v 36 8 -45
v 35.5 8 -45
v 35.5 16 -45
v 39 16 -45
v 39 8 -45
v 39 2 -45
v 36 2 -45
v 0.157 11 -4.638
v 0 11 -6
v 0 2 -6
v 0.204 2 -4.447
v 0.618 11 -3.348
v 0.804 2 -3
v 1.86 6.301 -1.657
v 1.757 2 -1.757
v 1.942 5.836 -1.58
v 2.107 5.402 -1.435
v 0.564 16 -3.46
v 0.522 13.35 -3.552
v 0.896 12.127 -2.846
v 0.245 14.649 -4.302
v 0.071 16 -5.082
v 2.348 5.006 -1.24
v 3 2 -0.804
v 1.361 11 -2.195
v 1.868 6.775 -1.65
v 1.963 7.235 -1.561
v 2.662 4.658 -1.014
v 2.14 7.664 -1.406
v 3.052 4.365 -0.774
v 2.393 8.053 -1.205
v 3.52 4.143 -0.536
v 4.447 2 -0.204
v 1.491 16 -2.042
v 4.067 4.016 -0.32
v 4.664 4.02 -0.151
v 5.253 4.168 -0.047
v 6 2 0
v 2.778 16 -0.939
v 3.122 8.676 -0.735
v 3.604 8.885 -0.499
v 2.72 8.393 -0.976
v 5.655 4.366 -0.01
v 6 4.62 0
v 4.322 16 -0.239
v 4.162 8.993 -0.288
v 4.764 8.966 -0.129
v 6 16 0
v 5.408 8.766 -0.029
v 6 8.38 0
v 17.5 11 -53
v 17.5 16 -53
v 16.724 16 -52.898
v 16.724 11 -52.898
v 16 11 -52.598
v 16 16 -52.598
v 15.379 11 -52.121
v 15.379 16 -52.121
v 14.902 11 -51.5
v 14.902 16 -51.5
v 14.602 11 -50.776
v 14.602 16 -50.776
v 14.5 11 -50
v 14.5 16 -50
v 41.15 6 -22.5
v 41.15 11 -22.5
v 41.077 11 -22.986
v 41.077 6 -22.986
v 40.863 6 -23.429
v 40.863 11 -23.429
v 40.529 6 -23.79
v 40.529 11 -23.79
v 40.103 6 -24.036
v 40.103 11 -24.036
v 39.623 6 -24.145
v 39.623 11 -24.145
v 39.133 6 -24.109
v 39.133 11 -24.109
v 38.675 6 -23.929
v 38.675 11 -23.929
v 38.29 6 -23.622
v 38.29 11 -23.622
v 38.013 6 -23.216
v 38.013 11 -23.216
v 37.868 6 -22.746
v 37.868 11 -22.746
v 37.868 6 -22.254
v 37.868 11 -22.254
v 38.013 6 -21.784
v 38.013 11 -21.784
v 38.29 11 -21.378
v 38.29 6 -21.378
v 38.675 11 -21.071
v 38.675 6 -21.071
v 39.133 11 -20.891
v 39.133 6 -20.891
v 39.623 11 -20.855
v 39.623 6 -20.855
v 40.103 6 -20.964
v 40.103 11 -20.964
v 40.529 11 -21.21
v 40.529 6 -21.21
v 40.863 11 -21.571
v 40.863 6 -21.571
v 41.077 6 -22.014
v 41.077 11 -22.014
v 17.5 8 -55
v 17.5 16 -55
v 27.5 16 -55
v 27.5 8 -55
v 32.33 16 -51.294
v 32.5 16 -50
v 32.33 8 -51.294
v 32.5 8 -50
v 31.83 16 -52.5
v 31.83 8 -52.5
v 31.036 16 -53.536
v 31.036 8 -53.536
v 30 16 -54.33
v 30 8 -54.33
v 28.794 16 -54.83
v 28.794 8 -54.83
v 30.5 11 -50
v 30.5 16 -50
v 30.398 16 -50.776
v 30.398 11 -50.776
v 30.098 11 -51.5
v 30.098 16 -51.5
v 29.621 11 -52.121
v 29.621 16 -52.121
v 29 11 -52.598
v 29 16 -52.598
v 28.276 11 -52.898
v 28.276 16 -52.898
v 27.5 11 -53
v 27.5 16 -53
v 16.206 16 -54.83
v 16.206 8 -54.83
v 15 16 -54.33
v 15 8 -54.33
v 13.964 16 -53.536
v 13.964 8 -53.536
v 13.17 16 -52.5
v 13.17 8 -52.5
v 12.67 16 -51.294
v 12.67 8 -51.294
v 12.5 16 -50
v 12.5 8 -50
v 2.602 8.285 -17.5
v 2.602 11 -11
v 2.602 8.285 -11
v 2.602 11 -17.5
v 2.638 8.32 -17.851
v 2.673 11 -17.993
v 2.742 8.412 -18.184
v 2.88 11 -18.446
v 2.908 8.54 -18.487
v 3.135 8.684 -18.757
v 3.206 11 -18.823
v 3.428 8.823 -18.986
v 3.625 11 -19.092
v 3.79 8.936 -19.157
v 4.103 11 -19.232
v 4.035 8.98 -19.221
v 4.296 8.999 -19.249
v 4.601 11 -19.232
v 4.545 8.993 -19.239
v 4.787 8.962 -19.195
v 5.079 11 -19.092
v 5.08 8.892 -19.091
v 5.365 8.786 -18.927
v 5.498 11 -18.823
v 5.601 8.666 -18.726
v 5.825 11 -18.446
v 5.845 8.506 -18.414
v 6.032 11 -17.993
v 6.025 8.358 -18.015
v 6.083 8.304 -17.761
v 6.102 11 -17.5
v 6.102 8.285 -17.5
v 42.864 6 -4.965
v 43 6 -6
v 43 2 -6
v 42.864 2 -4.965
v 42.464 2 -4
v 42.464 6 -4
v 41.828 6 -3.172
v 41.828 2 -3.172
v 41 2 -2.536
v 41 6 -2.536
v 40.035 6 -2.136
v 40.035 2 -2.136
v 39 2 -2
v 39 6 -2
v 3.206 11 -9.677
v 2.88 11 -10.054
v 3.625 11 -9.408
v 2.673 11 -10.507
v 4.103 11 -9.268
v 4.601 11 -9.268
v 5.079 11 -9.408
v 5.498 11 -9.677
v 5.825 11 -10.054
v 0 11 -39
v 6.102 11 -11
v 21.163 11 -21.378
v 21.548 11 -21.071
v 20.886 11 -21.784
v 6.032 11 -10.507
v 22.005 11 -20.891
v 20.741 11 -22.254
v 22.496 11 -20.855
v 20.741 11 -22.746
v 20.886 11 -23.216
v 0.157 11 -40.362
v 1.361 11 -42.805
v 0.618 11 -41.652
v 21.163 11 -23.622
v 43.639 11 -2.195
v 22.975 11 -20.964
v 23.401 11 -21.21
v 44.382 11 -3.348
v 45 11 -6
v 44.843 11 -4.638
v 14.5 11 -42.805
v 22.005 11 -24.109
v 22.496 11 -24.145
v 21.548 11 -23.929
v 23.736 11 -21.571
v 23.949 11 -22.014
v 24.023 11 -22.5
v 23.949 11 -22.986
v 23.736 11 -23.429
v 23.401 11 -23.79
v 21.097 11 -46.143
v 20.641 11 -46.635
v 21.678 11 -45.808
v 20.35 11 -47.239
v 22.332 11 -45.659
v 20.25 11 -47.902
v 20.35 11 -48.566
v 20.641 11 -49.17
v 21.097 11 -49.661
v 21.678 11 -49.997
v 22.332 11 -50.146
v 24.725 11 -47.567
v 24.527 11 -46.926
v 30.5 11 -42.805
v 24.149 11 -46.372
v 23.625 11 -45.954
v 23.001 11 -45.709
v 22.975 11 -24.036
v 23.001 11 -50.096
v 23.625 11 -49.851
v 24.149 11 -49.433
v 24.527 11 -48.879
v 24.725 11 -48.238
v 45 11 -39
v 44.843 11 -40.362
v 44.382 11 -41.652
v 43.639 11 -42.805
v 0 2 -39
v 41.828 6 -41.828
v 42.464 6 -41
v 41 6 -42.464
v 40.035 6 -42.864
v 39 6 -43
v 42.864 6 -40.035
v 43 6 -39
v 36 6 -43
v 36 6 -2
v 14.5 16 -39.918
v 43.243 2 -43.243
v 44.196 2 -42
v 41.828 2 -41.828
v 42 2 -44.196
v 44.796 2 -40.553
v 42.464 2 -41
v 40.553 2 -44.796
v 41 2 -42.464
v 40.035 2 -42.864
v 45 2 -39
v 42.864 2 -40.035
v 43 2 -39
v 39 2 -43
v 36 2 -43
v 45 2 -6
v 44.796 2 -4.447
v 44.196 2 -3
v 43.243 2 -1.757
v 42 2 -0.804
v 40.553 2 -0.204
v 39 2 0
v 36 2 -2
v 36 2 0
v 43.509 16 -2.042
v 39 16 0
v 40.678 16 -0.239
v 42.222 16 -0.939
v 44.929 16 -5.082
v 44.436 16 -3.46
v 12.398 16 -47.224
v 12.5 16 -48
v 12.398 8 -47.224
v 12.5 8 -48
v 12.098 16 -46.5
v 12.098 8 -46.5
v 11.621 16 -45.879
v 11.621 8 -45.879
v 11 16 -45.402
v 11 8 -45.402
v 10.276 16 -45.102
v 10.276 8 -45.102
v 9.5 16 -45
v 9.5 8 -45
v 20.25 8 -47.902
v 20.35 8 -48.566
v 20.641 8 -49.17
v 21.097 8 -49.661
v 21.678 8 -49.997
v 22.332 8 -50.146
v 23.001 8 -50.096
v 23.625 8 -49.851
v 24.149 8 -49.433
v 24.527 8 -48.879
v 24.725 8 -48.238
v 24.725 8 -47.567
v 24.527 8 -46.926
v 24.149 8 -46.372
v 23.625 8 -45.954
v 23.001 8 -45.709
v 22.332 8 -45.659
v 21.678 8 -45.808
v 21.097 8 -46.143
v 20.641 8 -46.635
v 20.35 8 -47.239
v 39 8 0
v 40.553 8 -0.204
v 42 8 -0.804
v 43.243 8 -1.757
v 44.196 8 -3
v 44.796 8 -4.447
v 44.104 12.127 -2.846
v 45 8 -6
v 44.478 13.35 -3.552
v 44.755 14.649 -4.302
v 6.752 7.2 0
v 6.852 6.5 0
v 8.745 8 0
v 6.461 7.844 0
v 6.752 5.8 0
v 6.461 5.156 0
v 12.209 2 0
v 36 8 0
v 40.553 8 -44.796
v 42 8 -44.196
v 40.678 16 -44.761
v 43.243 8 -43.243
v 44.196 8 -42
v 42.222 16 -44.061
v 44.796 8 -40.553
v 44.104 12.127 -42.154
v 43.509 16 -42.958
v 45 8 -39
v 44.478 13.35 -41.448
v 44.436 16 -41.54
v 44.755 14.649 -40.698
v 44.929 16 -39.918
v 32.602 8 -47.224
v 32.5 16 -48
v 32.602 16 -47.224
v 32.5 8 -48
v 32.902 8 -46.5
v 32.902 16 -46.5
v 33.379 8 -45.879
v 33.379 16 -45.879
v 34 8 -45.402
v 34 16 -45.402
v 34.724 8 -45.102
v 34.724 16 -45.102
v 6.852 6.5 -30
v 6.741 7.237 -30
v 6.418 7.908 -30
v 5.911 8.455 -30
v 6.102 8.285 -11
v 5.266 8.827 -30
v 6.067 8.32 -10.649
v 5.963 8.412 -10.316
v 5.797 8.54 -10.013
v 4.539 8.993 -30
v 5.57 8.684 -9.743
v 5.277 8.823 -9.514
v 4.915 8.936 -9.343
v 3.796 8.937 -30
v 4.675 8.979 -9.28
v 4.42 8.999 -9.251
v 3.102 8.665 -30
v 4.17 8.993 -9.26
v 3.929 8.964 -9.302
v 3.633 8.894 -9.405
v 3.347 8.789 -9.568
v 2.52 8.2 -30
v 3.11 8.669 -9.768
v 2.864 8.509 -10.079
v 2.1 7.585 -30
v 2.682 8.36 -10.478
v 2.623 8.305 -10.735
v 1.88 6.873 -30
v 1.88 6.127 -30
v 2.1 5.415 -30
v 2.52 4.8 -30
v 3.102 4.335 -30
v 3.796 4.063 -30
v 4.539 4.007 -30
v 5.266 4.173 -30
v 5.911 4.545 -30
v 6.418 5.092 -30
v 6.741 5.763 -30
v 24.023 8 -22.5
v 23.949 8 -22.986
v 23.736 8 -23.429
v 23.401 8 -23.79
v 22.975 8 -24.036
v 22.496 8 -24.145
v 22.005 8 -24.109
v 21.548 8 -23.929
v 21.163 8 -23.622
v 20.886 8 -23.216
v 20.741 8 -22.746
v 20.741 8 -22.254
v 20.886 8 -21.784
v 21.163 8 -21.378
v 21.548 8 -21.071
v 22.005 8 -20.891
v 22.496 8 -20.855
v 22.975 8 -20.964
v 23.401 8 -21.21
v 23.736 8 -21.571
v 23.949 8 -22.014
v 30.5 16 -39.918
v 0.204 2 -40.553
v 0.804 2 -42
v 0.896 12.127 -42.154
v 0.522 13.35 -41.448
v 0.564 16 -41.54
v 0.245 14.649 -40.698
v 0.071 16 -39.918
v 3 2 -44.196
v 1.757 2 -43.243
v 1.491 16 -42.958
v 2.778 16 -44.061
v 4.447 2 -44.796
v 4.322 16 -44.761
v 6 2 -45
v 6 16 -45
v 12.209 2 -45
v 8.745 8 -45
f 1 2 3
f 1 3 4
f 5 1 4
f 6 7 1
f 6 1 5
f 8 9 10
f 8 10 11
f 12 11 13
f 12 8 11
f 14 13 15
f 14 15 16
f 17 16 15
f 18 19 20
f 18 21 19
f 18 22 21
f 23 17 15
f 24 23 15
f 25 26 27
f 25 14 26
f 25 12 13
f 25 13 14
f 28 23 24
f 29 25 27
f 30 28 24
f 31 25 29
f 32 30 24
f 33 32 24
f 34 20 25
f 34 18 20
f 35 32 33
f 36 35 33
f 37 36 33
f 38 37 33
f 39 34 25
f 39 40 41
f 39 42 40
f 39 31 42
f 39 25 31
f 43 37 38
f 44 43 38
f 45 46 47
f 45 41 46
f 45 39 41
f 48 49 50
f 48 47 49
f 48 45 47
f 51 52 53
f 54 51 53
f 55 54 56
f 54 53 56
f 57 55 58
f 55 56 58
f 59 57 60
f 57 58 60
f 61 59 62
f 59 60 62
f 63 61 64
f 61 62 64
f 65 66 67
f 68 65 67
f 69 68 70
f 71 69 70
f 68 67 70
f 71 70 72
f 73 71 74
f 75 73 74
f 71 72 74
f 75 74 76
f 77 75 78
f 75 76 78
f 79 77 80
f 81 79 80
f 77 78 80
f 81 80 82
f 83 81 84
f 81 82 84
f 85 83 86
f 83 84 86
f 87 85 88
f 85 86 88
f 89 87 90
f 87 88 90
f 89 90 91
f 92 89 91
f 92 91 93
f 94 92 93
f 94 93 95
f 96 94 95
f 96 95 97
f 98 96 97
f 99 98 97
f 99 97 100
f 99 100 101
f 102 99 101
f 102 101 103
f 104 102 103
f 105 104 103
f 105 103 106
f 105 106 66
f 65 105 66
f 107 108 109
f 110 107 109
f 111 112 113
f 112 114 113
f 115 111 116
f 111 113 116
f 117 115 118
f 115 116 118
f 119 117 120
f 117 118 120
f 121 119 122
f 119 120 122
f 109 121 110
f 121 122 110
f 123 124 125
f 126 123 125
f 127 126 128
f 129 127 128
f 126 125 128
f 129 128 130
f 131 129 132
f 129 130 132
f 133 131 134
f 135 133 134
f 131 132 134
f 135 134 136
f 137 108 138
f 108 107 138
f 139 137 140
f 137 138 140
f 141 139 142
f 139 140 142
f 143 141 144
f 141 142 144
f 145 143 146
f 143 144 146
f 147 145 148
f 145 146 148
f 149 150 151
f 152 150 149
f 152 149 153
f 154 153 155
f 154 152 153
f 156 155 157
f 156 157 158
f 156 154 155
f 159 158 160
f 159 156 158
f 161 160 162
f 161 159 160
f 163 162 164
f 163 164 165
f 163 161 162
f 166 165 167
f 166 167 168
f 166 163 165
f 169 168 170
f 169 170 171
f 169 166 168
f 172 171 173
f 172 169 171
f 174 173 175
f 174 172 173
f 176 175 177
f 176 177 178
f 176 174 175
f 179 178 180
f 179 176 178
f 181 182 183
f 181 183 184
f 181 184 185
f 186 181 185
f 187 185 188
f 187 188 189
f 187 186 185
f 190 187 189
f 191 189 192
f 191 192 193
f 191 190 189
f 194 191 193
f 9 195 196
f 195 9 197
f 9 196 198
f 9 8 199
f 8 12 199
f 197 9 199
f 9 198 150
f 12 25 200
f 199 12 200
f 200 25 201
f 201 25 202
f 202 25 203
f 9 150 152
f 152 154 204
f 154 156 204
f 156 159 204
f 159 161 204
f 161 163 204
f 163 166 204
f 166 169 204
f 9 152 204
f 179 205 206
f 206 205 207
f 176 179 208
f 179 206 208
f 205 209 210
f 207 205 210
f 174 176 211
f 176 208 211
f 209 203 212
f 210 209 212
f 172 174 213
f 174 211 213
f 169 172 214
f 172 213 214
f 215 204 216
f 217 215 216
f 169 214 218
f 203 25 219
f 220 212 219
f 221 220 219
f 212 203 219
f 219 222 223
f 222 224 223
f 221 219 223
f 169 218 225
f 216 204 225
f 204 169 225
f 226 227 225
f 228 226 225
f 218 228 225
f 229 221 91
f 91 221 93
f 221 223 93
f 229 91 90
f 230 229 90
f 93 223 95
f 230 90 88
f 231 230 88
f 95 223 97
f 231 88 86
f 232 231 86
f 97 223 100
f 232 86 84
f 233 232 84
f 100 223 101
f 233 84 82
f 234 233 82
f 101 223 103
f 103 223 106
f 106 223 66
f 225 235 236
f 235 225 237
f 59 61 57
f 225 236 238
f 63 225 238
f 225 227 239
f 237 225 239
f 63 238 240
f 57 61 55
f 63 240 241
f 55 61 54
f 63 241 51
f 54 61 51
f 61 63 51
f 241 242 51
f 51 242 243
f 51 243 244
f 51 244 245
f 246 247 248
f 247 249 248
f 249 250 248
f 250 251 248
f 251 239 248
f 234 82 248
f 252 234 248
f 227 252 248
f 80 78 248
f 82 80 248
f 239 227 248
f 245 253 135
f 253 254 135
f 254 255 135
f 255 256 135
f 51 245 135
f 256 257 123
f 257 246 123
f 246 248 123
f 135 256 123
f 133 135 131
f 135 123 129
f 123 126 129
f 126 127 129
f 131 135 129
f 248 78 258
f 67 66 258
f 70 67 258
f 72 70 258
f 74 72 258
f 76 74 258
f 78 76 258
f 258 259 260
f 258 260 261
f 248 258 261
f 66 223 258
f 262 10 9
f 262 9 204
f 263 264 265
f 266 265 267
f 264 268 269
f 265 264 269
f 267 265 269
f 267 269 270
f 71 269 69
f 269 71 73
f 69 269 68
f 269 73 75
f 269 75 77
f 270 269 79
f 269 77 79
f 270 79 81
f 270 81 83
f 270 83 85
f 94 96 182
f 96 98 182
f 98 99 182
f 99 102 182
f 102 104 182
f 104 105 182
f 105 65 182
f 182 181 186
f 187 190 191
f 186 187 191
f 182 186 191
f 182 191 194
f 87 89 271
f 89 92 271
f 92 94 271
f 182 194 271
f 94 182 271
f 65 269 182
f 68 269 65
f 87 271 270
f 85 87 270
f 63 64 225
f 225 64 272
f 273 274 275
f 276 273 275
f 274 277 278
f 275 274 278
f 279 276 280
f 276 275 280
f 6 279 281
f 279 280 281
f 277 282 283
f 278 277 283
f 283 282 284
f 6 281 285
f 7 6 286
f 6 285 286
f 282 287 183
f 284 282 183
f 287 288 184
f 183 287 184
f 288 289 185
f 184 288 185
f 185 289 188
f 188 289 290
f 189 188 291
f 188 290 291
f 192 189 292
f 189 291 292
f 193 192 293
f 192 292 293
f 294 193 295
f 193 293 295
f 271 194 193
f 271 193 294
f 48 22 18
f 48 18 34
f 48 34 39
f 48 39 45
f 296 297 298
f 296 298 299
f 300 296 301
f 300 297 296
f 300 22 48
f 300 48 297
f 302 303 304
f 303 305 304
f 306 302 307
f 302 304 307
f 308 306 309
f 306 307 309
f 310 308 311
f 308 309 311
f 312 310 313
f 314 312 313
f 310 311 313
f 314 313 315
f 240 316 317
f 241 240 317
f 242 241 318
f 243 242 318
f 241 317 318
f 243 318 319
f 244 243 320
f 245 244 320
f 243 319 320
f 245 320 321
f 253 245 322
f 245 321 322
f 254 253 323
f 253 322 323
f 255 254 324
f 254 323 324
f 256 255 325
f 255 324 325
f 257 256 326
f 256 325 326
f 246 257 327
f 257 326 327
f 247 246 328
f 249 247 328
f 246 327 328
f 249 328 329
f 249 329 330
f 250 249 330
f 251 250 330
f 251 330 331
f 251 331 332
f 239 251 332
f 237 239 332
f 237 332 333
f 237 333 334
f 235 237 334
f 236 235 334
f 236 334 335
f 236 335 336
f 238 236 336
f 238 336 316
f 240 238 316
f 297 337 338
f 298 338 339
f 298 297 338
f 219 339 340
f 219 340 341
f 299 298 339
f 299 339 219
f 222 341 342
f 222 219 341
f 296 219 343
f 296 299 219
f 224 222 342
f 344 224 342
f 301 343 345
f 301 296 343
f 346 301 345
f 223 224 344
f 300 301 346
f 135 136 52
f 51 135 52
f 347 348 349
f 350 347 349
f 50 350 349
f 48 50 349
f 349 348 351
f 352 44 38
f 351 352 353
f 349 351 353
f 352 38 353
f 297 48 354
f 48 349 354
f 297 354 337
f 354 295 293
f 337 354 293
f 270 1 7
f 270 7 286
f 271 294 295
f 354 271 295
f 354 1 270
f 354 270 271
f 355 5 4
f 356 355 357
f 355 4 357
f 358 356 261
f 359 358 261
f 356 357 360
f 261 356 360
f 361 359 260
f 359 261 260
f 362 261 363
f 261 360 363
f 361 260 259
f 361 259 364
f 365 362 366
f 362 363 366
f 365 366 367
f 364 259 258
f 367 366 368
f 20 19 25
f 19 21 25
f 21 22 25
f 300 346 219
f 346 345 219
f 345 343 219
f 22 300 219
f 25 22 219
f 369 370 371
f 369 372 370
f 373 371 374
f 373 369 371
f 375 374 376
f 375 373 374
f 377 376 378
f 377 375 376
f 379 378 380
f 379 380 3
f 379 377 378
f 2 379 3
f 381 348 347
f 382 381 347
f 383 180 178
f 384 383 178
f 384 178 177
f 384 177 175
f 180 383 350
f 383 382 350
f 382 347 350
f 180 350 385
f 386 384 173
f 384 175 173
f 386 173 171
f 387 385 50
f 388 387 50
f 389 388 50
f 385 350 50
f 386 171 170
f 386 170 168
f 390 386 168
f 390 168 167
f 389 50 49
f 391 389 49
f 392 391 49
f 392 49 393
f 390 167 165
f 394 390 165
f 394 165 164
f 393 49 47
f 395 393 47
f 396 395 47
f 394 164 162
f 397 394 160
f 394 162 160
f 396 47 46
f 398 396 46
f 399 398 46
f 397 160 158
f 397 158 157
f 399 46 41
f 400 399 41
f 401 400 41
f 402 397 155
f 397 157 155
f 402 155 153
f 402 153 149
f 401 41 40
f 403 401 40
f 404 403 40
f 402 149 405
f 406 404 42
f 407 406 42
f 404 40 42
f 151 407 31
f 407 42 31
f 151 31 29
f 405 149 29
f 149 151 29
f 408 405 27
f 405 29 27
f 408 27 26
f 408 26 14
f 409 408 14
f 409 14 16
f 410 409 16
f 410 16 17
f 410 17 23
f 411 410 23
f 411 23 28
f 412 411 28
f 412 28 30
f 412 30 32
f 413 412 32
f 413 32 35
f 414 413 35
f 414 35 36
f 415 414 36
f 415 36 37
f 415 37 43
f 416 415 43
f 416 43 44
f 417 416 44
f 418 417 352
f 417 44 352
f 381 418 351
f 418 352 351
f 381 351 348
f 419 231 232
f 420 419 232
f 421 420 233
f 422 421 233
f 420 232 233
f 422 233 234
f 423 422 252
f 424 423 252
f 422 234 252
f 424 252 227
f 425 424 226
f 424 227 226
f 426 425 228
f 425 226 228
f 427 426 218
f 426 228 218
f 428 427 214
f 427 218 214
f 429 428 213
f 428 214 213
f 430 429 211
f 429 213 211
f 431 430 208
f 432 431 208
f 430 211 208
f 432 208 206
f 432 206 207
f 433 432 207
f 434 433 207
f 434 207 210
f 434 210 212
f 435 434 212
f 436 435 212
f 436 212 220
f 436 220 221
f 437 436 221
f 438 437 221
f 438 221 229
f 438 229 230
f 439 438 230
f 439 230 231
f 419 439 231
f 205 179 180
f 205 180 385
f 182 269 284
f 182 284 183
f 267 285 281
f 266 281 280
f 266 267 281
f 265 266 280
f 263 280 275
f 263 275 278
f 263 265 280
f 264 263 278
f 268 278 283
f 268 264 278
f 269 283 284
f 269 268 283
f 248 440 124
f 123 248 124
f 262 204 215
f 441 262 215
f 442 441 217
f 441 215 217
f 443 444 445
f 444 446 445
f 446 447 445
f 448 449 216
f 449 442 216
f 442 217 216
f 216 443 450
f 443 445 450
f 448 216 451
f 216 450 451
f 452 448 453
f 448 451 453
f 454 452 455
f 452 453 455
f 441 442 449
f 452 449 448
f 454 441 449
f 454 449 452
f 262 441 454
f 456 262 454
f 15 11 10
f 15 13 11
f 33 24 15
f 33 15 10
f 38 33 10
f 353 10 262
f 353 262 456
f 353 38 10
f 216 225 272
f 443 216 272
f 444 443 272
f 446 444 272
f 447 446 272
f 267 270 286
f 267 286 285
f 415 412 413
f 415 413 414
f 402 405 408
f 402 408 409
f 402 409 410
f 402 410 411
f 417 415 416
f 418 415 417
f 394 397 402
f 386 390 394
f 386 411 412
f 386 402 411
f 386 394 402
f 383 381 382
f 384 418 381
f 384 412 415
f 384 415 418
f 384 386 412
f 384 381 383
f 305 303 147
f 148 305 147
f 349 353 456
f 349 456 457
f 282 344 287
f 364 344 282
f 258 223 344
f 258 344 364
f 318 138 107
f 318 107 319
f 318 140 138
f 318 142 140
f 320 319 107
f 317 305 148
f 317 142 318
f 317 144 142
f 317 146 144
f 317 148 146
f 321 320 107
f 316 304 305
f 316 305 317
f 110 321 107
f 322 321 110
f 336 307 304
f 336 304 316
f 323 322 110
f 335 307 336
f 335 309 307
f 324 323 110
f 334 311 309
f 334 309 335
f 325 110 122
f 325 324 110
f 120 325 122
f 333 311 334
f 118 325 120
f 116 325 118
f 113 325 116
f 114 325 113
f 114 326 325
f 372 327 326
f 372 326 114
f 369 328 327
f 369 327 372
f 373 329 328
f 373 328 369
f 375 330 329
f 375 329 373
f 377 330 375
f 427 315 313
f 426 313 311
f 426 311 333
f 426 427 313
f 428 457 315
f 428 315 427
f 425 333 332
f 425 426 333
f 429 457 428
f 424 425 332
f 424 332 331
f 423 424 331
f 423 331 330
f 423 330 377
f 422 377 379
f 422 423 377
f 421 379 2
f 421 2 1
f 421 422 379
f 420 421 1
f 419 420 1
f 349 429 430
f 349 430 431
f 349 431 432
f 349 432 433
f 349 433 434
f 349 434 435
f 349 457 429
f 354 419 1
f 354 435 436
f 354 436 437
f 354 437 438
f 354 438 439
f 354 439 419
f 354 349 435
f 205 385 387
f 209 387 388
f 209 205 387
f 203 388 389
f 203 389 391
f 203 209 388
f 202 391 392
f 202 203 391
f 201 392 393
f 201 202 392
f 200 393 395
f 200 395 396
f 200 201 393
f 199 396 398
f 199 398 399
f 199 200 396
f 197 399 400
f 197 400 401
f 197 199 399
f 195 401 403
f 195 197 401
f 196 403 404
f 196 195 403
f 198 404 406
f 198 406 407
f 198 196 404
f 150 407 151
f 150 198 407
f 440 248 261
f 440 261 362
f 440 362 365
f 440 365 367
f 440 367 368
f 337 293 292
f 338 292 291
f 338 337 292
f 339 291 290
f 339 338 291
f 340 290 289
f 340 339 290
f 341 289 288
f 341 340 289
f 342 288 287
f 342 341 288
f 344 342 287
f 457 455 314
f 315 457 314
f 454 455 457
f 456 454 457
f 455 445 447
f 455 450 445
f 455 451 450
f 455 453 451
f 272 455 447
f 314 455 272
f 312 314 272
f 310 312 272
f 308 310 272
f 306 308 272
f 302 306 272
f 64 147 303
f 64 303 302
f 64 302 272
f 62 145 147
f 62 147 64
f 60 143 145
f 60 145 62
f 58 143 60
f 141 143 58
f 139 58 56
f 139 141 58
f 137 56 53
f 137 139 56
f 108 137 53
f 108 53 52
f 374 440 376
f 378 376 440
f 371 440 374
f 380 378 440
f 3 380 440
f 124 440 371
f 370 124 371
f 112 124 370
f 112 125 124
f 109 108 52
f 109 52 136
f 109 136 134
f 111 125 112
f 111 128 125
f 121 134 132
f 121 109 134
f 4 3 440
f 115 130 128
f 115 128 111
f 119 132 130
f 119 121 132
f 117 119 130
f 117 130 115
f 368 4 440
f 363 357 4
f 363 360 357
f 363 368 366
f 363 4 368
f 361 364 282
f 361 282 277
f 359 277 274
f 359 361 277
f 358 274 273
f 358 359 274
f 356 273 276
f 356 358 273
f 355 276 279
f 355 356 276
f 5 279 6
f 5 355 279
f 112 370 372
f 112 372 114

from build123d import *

# Parameters (mm, degrees)
SKETCH_1_W               = 45
SKETCH_1_H               = 45
EXTRUDE_1_DEPTH          = 16
CUT_EXTRUDE_1_DEPTH      = 66.620118866
SKETCH_3_W               = 13.364101615
SKETCH_3_H               = 45
CUT_EXTRUDE_2_DEPTH      = 8
CUT_EXTRUDE_3_REACH      = 67.62
FILLET_1_R               = 6
F_2MM_W                  = 50.544050544
F_2MM_H                  = 52.749609113
CUT_EXTRUDE_4_DEPTH      = 2
EXTRUDE_2_DEPTH          = 6
SKETCH_6_R               = 2.5
CUT_EXTRUDE_5_DEPTH      = 30
EXTRUDE_3_DEPTH          = 2
SKETCH_9_W               = 20
SKETCH_9_H               = 10
EXTRUDE_4_DEPTH          = 8
FILLET_2_R               = 5
CUT_EXTRUDE_6_DEPTH      = 5
FILLET_3_R               = 3
HOLE_WIZARD_M41_D        = 4.5
M4X0_71_D                = 3.3
CUT_EXTRUDE_7_REACH      = 73.631
CUT_EXTRUDE_7_END_RADIUS = 2.5
M4X0_72_D                = 3.3


with BuildPart() as part:
    # Эскиз1 → Бобышка-Вытянуть1 (new body)
    with BuildSketch(Plane(origin=(0, 0, 0), x_dir=(1, 0, 0), z_dir=(0, 1, 0))):
        with Locations((22.5, 22.5)):
            Rectangle(SKETCH_1_W, SKETCH_1_H)
    extrude(amount=EXTRUDE_1_DEPTH)

    # Эскиз2 → Вырез-Вытянуть1 (cut, through all)
    with BuildSketch(Plane.XY):
        Polygon((8.745299462, 8), (36.254700538, 8), (31.635898385, 0), (13.364101615, 0), align=None)
    extrude(amount=-CUT_EXTRUDE_1_DEPTH, mode=Mode.SUBTRACT)

    # Эскиз3 → Вырез-Вытянуть2 (cut)
    with BuildSketch(Plane.XZ):
        with Locations((38.317949193, -22.5)):
            Rectangle(SKETCH_3_W, SKETCH_3_H)
    extrude(amount=-CUT_EXTRUDE_2_DEPTH, mode=Mode.SUBTRACT)

    # Эскиз4 → Вырез-Вытянуть3 (cut, up to next)
    with BuildSketch(Plane(origin=(45, 0, 0), x_dir=(0, 0, -1), z_dir=(1, 0, 0)), mode=Mode.PRIVATE) as cut_extrude_3_sk1:
        Polygon((5.082050808, 16), (2.195299462, 11), (42.804700538, 11), (39.917949192, 16), align=None)
    cut_extrude_3_tool1 = extrude(cut_extrude_3_sk1.sketch, amount=-CUT_EXTRUDE_3_REACH, mode=Mode.PRIVATE) & part.part
    add(cut_extrude_3_tool1.solids().sort_by_distance((45, 13.436229, -22.5))[0], mode=Mode.SUBTRACT)

    # Скругление1
    fillet_1_edges = [part.edges().sort_by_distance(p)[0] for p in [
        (0, 8, -45),
        (45, 12, -45),
        (45, 12, 0),
        (0, 8, 0),
    ]]
    fillet(fillet_1_edges, radius=FILLET_1_R)

    # -2mm → Вырез-Вытянуть4 (cut)
    with BuildSketch(Plane.XZ):
        with Locations((21.76481381, -22.637847411)):
            Rectangle(F_2MM_W, F_2MM_H)
    extrude(amount=-CUT_EXTRUDE_4_DEPTH, mode=Mode.SUBTRACT)

    # Эскиз7 → Бобышка-Вытянуть2 (add)
    with BuildSketch(Plane.XZ.offset(-8)):
        with BuildLine():
            Line((43, -39), (43, -6))
            ThreePointArc((43, -6), (41.828427125, -3.171572875), (39, -2))
            Line((39, -2), (36, -2))
            Line((36, -2), (36, 0))
            Line((36, 0), (39, 0))
            ThreePointArc((39, 0), (43.242640687, -1.757359313), (45, -6))
            Line((45, -6), (45, -39))
            ThreePointArc((45, -39), (43.242640687, -43.242640687), (39, -45))
            Line((39, -45), (36, -45))
            Line((36, -45), (36, -43))
            Line((36, -43), (39, -43))
            ThreePointArc((39, -43), (41.828427125, -41.828427125), (43, -39))
        make_face()
    extrude(amount=EXTRUDE_2_DEPTH)

    # Эскиз6 → Вырез-Вытянуть5 (cut)
    with BuildSketch(Plane.XY):
        with Locations((4.352411604, 6.5)):
            Circle(SKETCH_6_R)
    extrude(amount=-CUT_EXTRUDE_5_DEPTH, mode=Mode.SUBTRACT)

    # Эскиз8 → Бобышка-Вытянуть3 (add)
    with BuildSketch(Plane.XZ.offset(-8)):
        with BuildLine():
            Line((36, -2), (39, -2))
            ThreePointArc((39, -2), (41.828427125, -3.171572875), (43, -6))
            Line((43, -6), (43, -39))
            ThreePointArc((43, -39), (41.828427125, -41.828427125), (39, -43))
            Line((39, -43), (36, -43))
            Line((36, -43), (36, -2))
        make_face()
    extrude(amount=EXTRUDE_3_DEPTH)

    # Эскиз9 → Бобышка-Вытянуть4 (add)
    with BuildSketch(Plane(origin=(0, 16, 0), x_dir=(1, 0, 0), z_dir=(0, 1, 0))):
        with Locations((22.5, 50)):
            Rectangle(SKETCH_9_W, SKETCH_9_H)
    extrude(amount=-EXTRUDE_4_DEPTH)

    # Скругление2
    fillet_2_edges = [part.edges().sort_by_distance(p)[0] for p in [
        (32.5, 12, -55),
        (12.5, 12, -55),
    ]]
    fillet(fillet_2_edges, radius=FILLET_2_R)

    # Эскиз10 → Вырез-Вытянуть6 (cut)
    with BuildSketch(Plane(origin=(0, 16, 0), x_dir=(1, 0, 0), z_dir=(0, 1, 0))):
        with BuildLine():
            Line((14.5, 50), (14.5, 39.917949192))
            Line((14.5, 39.917949192), (30.5, 39.917949192))
            Line((30.5, 39.917949192), (30.5, 50))
            ThreePointArc((30.5, 50), (29.621320344, 52.121320344), (27.5, 53))
            Line((27.5, 53), (17.5, 53))
            ThreePointArc((17.5, 53), (15.378679656, 52.121320344), (14.5, 50))
        make_face()
    extrude(amount=-CUT_EXTRUDE_6_DEPTH, mode=Mode.SUBTRACT)

    # Скругление3
    fillet_3_edges = [part.edges().sort_by_distance(p)[0] for p in [
        (32.5, 12, -45),
        (12.5, 12, -45),
    ]]
    fillet(fillet_3_edges, radius=FILLET_3_R)

    # Отверстие с зазором M41 (through all)
    with Locations(Plane(origin=(0, 11, 0), x_dir=(1, 0, 0), z_dir=(0, 1, 0))):
        with Locations((22.5, 47.902350269)):
            Hole(HOLE_WIZARD_M41_D / 2)

    # Отверстие обработанное метчиком M4x0.71 (through all)
    with Locations(Plane(origin=(0, 6, 0), x_dir=(-1, 0, 0), z_dir=(0, -1, 0))):
        with Locations((-39.5, 22.5)):
            Hole(M4X0_71_D / 2)

    # Вырез-Вытянуть7: up to this cylinder (the profile starts outside it)
    cut_extrude_7_end = Plane(origin=(4.352411604, 6.5, -14.25), z_dir=(0, 0, 1)) * Cylinder(CUT_EXTRUDE_7_END_RADIUS, 153.262, mode=Mode.PRIVATE)
    # Эскиз17 → Вырез-Вытянуть7 (cut, up to the surface)
    with BuildSketch(Plane(origin=(0, 11, 0), x_dir=(1, 0, 0), z_dir=(0, 1, 0)), mode=Mode.PRIVATE) as cut_extrude_7_sk1:
        with BuildLine():
            Line((6.102411604, 17.5), (6.102411604, 11))
            ThreePointArc((6.102411604, 11), (4.352411604, 9.25), (2.602411604, 11))
            Line((2.602411604, 11), (2.602411604, 17.5))
            ThreePointArc((2.602411604, 17.5), (4.352411604, 19.25), (6.102411604, 17.5))
        make_face()
    cut_extrude_7_tool1 = extrude(cut_extrude_7_sk1.sketch, amount=-CUT_EXTRUDE_7_REACH, mode=Mode.PRIVATE) - cut_extrude_7_end
    add(cut_extrude_7_tool1.solids().sort_by_distance((4.352412, 11, -14.25))[0], mode=Mode.SUBTRACT)

    # Отверстие обработанное метчиком M4x0.72 (through all)
    with Locations(Plane(origin=(0, 8, 0), x_dir=(-1, 0, 0), z_dir=(0, -1, 0))):
        with Locations((-22.372649731, 22.5)):
            Hole(M4X0_72_D / 2)


solid = part.part
